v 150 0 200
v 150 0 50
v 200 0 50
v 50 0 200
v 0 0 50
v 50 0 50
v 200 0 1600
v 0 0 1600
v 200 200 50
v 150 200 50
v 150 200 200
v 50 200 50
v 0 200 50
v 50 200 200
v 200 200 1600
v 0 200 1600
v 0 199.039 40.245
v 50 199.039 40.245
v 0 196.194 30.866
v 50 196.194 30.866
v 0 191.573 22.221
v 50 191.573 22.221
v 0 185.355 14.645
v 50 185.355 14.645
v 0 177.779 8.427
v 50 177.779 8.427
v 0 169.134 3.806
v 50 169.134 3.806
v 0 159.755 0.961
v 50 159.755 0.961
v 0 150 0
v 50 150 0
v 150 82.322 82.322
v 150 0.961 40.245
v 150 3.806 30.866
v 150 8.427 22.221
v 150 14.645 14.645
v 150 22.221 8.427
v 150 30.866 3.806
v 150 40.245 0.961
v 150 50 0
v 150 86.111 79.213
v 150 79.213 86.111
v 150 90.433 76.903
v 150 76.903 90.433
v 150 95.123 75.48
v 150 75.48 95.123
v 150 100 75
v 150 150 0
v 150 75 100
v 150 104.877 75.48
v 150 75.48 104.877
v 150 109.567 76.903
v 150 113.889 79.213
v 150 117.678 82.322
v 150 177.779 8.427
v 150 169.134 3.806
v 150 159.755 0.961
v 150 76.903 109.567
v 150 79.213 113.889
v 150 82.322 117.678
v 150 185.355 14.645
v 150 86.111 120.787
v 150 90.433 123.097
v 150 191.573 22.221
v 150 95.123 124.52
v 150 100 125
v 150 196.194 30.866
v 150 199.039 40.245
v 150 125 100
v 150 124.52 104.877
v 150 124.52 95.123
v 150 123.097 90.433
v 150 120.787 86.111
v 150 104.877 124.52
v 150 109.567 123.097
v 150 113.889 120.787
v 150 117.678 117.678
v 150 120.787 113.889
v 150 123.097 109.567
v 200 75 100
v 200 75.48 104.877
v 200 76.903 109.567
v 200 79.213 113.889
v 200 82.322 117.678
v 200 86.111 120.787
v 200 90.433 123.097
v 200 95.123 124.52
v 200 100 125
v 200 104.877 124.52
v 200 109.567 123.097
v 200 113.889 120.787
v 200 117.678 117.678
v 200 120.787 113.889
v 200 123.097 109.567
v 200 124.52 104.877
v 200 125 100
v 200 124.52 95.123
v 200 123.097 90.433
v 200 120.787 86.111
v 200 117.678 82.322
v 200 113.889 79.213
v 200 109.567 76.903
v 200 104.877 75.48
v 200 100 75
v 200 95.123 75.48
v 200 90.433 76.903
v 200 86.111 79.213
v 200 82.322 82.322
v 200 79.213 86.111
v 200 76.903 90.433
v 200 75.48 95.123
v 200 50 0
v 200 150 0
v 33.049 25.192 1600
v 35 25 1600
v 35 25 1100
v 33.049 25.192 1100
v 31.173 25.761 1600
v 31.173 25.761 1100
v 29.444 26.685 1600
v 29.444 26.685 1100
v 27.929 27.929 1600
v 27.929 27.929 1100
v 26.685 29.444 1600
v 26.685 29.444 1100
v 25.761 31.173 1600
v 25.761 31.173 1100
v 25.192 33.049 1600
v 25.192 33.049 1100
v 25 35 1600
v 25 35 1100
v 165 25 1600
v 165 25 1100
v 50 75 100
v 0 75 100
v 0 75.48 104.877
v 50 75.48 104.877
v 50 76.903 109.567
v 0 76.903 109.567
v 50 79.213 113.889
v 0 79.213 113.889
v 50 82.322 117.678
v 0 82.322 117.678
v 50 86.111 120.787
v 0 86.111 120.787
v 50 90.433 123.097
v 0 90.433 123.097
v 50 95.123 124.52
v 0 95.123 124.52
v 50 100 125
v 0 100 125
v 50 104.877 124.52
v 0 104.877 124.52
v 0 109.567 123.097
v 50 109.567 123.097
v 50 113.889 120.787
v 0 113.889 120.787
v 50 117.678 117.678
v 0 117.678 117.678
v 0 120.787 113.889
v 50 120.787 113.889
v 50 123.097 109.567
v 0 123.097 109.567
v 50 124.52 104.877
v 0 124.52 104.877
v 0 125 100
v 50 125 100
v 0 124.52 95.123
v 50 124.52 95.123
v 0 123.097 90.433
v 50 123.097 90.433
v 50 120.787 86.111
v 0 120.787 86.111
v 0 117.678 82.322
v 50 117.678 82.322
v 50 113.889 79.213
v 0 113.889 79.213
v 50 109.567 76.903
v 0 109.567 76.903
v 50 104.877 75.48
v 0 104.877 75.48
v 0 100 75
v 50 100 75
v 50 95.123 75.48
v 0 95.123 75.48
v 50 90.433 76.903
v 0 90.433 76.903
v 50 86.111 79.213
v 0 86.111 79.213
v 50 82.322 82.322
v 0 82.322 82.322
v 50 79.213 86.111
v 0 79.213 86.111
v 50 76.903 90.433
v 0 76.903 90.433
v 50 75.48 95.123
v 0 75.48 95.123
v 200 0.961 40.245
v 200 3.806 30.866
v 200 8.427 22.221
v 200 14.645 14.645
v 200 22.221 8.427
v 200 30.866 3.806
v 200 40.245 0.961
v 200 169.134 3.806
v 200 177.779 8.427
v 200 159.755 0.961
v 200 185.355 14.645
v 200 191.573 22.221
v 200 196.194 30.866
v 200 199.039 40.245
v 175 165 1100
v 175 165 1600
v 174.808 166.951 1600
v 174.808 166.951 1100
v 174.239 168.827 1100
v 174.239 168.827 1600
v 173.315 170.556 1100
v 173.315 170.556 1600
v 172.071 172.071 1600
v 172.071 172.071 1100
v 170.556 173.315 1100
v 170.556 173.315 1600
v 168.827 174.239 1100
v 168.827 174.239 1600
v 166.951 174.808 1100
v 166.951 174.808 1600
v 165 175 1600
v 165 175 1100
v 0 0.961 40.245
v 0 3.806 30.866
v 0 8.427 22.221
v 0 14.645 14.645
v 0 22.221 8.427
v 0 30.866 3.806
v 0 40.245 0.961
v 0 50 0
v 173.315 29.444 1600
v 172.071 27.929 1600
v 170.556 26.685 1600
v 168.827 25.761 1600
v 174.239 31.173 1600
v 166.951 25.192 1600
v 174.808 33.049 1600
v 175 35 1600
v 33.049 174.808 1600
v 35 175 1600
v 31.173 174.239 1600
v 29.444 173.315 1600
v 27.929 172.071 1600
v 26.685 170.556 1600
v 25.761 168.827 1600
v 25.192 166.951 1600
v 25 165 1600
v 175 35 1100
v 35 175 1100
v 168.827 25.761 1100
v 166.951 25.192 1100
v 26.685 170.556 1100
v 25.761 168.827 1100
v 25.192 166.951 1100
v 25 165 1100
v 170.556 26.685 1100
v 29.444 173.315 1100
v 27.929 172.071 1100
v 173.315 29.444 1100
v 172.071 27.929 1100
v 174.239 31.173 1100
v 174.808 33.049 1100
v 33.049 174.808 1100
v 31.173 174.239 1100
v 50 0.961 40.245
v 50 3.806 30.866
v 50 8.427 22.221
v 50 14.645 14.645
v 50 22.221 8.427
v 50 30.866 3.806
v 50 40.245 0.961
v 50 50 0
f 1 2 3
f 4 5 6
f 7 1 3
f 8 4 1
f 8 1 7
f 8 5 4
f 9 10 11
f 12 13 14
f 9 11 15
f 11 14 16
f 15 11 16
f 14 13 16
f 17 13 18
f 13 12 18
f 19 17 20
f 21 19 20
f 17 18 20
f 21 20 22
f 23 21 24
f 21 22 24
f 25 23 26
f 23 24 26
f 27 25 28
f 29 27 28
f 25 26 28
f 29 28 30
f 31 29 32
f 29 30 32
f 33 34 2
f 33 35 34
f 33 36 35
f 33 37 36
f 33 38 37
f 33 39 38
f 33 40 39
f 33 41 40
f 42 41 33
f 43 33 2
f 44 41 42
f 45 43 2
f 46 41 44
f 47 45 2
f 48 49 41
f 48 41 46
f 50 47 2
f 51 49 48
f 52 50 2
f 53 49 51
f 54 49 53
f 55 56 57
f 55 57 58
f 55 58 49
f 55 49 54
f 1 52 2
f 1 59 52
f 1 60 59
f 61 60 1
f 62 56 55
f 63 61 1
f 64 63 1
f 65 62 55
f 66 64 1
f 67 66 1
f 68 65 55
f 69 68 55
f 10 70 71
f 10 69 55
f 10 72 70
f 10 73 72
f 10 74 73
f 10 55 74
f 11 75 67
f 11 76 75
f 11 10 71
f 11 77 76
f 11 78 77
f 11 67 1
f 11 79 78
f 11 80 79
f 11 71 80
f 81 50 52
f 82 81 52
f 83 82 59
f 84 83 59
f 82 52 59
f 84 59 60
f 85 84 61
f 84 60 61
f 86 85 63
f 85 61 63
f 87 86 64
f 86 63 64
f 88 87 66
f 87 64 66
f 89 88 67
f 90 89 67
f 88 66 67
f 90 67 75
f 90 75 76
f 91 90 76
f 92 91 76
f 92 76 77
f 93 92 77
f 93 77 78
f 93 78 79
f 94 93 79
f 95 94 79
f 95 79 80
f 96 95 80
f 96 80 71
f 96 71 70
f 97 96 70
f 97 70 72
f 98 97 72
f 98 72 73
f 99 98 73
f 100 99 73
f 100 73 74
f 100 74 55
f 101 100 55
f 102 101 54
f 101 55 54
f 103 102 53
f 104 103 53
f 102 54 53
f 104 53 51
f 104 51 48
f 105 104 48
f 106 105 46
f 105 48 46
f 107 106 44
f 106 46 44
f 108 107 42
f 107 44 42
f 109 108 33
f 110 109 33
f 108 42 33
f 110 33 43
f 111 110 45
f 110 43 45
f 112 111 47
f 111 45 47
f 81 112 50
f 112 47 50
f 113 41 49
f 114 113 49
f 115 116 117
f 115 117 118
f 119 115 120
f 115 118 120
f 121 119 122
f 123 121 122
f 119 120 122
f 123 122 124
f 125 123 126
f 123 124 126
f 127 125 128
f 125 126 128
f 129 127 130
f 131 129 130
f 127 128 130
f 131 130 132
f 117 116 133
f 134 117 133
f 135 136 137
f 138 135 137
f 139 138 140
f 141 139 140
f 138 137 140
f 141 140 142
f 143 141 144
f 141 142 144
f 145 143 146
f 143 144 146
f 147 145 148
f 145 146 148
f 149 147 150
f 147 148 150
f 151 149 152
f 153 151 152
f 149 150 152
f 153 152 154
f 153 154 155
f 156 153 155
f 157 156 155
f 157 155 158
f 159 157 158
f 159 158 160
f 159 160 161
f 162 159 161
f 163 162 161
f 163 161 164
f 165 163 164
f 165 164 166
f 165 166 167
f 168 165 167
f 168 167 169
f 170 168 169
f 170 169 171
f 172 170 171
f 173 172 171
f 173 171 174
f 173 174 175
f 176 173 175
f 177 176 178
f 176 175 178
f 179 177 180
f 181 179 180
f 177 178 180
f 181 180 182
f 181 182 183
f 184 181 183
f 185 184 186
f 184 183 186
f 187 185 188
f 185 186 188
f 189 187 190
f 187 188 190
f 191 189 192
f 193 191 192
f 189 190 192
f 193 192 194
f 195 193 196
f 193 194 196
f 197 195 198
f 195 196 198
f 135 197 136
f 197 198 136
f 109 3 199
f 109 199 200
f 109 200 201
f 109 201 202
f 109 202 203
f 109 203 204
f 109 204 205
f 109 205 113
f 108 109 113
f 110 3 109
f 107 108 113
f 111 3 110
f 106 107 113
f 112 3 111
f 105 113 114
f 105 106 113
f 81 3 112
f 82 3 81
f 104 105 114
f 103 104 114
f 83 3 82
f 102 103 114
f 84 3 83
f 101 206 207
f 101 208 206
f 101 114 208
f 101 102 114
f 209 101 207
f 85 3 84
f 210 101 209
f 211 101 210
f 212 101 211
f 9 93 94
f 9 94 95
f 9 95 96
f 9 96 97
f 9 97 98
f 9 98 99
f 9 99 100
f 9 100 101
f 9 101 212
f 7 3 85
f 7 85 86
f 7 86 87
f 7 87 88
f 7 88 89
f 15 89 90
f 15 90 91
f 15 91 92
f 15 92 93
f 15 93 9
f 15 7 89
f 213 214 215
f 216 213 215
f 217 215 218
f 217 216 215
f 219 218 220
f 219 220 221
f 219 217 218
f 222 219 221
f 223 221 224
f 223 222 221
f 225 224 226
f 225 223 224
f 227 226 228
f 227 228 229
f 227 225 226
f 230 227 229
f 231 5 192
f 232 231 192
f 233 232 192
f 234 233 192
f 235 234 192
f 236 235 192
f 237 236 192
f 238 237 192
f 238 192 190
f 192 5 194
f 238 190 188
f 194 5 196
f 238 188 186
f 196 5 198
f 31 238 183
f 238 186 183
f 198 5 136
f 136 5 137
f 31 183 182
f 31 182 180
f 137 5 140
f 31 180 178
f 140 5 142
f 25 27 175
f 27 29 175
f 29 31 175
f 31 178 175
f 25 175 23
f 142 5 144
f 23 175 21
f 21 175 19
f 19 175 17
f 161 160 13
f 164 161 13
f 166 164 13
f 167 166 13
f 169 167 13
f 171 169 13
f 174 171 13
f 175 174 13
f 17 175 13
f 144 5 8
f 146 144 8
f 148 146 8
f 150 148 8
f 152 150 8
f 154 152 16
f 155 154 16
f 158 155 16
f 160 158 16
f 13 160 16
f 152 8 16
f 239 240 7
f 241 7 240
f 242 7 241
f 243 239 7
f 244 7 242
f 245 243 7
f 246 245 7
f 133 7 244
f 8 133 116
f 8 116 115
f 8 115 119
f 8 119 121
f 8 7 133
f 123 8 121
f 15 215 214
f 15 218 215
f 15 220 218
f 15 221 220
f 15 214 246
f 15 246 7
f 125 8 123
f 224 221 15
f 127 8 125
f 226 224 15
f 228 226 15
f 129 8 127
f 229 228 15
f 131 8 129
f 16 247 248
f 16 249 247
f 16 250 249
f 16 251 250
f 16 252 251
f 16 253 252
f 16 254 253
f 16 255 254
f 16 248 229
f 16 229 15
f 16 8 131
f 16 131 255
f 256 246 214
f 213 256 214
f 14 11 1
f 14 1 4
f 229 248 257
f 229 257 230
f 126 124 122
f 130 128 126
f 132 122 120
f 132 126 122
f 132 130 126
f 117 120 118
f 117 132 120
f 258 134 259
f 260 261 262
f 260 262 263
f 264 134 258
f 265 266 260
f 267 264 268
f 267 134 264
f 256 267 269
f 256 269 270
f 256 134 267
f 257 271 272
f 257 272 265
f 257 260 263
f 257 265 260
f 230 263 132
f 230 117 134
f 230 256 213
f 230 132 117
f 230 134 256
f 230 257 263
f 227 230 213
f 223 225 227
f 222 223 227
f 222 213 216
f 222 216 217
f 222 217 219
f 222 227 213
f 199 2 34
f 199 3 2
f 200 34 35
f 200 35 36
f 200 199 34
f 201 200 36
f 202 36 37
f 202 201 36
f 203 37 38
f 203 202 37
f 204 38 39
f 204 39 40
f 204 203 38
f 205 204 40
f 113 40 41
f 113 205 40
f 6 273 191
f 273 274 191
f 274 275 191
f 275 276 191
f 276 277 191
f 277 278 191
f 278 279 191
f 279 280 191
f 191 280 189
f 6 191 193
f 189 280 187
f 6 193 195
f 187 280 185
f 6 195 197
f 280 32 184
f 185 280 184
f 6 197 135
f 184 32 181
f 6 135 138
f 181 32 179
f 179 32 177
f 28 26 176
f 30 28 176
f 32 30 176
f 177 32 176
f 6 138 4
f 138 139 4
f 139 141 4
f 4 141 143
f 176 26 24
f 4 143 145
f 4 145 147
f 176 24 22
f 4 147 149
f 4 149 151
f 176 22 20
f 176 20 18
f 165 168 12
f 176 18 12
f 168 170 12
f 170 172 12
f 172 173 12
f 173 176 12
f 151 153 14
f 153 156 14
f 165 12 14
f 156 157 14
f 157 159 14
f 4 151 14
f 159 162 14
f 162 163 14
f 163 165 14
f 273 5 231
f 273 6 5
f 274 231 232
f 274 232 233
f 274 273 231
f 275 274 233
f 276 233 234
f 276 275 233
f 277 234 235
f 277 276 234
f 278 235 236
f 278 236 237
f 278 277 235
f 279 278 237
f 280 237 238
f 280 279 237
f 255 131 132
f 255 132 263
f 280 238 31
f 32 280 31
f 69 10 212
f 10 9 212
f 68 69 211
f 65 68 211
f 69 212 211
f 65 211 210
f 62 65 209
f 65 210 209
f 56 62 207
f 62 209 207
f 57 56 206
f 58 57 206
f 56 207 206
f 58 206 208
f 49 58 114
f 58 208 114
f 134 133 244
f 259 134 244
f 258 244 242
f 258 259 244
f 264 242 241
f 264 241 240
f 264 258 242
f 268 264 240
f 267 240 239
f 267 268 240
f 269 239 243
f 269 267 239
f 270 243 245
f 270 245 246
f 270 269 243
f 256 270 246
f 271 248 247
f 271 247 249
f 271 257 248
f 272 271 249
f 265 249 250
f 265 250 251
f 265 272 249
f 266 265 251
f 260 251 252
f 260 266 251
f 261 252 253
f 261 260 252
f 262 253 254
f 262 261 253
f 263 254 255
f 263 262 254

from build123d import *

# Parameters (mm, degrees)
F0_W     = 200
F0_H     = 1600
F1_DEPTH = 200
F2_W     = 100
F2_H     = 200
F3_DEPTH = 400
F4_W     = 150
F4_H     = 150
F5_DEPTH = 500
F6_R     = 25
F7_DEPTH = 300
F8_R     = 10
F9_R     = 50


with BuildPart() as f1:
    # F0 (on Right) → F1 (new body)
    with BuildSketch(Plane.YZ):
        with Locations((100, 800)):
            Rectangle(F0_W, F0_H)
    extrude(amount=F1_DEPTH)

    # F2 (on face) → F3 (cut)
    with BuildSketch(Plane(origin=(0, 200, 0), x_dir=(-1, 0, 0), z_dir=(0, 1, 0))):
        with Locations((-100, 100)):
            Rectangle(F2_W, F2_H)
    extrude(amount=-F3_DEPTH, mode=Mode.SUBTRACT)

    # F4 (on face) → F5 (cut)
    with BuildSketch(Plane.XY.offset(1600)):
        with Locations((100, 100)):
            Rectangle(F4_W, F4_H)
    extrude(amount=-F5_DEPTH, mode=Mode.SUBTRACT)

    # F6 (on face) → F7 (cut)
    with BuildSketch(Plane(origin=(0, 0, 0), x_dir=(0, -1, 0), z_dir=(-1, 0, 0))):
        with Locations((-100, 100)):
            Circle(F6_R)
    extrude(amount=-F7_DEPTH, mode=Mode.SUBTRACT)

    # F8
    f8_edges = [f1.edges().sort_by_distance(p)[0] for p in [
        (25, 175, 1350),
        (175, 175, 1350),
        (25, 25, 1350),
        (175, 25, 1350),
    ]]
    fillet(f8_edges, radius=F8_R)

    # F9
    f9_edges = [f1.edges().sort_by_distance(p)[0] for p in [
        (175, 200, 0),
        (25, 200, 0),
        (25, 0, 0),
        (175, 0, 0),
    ]]
    fillet(f9_edges, radius=F9_R)


solid = f1.part
